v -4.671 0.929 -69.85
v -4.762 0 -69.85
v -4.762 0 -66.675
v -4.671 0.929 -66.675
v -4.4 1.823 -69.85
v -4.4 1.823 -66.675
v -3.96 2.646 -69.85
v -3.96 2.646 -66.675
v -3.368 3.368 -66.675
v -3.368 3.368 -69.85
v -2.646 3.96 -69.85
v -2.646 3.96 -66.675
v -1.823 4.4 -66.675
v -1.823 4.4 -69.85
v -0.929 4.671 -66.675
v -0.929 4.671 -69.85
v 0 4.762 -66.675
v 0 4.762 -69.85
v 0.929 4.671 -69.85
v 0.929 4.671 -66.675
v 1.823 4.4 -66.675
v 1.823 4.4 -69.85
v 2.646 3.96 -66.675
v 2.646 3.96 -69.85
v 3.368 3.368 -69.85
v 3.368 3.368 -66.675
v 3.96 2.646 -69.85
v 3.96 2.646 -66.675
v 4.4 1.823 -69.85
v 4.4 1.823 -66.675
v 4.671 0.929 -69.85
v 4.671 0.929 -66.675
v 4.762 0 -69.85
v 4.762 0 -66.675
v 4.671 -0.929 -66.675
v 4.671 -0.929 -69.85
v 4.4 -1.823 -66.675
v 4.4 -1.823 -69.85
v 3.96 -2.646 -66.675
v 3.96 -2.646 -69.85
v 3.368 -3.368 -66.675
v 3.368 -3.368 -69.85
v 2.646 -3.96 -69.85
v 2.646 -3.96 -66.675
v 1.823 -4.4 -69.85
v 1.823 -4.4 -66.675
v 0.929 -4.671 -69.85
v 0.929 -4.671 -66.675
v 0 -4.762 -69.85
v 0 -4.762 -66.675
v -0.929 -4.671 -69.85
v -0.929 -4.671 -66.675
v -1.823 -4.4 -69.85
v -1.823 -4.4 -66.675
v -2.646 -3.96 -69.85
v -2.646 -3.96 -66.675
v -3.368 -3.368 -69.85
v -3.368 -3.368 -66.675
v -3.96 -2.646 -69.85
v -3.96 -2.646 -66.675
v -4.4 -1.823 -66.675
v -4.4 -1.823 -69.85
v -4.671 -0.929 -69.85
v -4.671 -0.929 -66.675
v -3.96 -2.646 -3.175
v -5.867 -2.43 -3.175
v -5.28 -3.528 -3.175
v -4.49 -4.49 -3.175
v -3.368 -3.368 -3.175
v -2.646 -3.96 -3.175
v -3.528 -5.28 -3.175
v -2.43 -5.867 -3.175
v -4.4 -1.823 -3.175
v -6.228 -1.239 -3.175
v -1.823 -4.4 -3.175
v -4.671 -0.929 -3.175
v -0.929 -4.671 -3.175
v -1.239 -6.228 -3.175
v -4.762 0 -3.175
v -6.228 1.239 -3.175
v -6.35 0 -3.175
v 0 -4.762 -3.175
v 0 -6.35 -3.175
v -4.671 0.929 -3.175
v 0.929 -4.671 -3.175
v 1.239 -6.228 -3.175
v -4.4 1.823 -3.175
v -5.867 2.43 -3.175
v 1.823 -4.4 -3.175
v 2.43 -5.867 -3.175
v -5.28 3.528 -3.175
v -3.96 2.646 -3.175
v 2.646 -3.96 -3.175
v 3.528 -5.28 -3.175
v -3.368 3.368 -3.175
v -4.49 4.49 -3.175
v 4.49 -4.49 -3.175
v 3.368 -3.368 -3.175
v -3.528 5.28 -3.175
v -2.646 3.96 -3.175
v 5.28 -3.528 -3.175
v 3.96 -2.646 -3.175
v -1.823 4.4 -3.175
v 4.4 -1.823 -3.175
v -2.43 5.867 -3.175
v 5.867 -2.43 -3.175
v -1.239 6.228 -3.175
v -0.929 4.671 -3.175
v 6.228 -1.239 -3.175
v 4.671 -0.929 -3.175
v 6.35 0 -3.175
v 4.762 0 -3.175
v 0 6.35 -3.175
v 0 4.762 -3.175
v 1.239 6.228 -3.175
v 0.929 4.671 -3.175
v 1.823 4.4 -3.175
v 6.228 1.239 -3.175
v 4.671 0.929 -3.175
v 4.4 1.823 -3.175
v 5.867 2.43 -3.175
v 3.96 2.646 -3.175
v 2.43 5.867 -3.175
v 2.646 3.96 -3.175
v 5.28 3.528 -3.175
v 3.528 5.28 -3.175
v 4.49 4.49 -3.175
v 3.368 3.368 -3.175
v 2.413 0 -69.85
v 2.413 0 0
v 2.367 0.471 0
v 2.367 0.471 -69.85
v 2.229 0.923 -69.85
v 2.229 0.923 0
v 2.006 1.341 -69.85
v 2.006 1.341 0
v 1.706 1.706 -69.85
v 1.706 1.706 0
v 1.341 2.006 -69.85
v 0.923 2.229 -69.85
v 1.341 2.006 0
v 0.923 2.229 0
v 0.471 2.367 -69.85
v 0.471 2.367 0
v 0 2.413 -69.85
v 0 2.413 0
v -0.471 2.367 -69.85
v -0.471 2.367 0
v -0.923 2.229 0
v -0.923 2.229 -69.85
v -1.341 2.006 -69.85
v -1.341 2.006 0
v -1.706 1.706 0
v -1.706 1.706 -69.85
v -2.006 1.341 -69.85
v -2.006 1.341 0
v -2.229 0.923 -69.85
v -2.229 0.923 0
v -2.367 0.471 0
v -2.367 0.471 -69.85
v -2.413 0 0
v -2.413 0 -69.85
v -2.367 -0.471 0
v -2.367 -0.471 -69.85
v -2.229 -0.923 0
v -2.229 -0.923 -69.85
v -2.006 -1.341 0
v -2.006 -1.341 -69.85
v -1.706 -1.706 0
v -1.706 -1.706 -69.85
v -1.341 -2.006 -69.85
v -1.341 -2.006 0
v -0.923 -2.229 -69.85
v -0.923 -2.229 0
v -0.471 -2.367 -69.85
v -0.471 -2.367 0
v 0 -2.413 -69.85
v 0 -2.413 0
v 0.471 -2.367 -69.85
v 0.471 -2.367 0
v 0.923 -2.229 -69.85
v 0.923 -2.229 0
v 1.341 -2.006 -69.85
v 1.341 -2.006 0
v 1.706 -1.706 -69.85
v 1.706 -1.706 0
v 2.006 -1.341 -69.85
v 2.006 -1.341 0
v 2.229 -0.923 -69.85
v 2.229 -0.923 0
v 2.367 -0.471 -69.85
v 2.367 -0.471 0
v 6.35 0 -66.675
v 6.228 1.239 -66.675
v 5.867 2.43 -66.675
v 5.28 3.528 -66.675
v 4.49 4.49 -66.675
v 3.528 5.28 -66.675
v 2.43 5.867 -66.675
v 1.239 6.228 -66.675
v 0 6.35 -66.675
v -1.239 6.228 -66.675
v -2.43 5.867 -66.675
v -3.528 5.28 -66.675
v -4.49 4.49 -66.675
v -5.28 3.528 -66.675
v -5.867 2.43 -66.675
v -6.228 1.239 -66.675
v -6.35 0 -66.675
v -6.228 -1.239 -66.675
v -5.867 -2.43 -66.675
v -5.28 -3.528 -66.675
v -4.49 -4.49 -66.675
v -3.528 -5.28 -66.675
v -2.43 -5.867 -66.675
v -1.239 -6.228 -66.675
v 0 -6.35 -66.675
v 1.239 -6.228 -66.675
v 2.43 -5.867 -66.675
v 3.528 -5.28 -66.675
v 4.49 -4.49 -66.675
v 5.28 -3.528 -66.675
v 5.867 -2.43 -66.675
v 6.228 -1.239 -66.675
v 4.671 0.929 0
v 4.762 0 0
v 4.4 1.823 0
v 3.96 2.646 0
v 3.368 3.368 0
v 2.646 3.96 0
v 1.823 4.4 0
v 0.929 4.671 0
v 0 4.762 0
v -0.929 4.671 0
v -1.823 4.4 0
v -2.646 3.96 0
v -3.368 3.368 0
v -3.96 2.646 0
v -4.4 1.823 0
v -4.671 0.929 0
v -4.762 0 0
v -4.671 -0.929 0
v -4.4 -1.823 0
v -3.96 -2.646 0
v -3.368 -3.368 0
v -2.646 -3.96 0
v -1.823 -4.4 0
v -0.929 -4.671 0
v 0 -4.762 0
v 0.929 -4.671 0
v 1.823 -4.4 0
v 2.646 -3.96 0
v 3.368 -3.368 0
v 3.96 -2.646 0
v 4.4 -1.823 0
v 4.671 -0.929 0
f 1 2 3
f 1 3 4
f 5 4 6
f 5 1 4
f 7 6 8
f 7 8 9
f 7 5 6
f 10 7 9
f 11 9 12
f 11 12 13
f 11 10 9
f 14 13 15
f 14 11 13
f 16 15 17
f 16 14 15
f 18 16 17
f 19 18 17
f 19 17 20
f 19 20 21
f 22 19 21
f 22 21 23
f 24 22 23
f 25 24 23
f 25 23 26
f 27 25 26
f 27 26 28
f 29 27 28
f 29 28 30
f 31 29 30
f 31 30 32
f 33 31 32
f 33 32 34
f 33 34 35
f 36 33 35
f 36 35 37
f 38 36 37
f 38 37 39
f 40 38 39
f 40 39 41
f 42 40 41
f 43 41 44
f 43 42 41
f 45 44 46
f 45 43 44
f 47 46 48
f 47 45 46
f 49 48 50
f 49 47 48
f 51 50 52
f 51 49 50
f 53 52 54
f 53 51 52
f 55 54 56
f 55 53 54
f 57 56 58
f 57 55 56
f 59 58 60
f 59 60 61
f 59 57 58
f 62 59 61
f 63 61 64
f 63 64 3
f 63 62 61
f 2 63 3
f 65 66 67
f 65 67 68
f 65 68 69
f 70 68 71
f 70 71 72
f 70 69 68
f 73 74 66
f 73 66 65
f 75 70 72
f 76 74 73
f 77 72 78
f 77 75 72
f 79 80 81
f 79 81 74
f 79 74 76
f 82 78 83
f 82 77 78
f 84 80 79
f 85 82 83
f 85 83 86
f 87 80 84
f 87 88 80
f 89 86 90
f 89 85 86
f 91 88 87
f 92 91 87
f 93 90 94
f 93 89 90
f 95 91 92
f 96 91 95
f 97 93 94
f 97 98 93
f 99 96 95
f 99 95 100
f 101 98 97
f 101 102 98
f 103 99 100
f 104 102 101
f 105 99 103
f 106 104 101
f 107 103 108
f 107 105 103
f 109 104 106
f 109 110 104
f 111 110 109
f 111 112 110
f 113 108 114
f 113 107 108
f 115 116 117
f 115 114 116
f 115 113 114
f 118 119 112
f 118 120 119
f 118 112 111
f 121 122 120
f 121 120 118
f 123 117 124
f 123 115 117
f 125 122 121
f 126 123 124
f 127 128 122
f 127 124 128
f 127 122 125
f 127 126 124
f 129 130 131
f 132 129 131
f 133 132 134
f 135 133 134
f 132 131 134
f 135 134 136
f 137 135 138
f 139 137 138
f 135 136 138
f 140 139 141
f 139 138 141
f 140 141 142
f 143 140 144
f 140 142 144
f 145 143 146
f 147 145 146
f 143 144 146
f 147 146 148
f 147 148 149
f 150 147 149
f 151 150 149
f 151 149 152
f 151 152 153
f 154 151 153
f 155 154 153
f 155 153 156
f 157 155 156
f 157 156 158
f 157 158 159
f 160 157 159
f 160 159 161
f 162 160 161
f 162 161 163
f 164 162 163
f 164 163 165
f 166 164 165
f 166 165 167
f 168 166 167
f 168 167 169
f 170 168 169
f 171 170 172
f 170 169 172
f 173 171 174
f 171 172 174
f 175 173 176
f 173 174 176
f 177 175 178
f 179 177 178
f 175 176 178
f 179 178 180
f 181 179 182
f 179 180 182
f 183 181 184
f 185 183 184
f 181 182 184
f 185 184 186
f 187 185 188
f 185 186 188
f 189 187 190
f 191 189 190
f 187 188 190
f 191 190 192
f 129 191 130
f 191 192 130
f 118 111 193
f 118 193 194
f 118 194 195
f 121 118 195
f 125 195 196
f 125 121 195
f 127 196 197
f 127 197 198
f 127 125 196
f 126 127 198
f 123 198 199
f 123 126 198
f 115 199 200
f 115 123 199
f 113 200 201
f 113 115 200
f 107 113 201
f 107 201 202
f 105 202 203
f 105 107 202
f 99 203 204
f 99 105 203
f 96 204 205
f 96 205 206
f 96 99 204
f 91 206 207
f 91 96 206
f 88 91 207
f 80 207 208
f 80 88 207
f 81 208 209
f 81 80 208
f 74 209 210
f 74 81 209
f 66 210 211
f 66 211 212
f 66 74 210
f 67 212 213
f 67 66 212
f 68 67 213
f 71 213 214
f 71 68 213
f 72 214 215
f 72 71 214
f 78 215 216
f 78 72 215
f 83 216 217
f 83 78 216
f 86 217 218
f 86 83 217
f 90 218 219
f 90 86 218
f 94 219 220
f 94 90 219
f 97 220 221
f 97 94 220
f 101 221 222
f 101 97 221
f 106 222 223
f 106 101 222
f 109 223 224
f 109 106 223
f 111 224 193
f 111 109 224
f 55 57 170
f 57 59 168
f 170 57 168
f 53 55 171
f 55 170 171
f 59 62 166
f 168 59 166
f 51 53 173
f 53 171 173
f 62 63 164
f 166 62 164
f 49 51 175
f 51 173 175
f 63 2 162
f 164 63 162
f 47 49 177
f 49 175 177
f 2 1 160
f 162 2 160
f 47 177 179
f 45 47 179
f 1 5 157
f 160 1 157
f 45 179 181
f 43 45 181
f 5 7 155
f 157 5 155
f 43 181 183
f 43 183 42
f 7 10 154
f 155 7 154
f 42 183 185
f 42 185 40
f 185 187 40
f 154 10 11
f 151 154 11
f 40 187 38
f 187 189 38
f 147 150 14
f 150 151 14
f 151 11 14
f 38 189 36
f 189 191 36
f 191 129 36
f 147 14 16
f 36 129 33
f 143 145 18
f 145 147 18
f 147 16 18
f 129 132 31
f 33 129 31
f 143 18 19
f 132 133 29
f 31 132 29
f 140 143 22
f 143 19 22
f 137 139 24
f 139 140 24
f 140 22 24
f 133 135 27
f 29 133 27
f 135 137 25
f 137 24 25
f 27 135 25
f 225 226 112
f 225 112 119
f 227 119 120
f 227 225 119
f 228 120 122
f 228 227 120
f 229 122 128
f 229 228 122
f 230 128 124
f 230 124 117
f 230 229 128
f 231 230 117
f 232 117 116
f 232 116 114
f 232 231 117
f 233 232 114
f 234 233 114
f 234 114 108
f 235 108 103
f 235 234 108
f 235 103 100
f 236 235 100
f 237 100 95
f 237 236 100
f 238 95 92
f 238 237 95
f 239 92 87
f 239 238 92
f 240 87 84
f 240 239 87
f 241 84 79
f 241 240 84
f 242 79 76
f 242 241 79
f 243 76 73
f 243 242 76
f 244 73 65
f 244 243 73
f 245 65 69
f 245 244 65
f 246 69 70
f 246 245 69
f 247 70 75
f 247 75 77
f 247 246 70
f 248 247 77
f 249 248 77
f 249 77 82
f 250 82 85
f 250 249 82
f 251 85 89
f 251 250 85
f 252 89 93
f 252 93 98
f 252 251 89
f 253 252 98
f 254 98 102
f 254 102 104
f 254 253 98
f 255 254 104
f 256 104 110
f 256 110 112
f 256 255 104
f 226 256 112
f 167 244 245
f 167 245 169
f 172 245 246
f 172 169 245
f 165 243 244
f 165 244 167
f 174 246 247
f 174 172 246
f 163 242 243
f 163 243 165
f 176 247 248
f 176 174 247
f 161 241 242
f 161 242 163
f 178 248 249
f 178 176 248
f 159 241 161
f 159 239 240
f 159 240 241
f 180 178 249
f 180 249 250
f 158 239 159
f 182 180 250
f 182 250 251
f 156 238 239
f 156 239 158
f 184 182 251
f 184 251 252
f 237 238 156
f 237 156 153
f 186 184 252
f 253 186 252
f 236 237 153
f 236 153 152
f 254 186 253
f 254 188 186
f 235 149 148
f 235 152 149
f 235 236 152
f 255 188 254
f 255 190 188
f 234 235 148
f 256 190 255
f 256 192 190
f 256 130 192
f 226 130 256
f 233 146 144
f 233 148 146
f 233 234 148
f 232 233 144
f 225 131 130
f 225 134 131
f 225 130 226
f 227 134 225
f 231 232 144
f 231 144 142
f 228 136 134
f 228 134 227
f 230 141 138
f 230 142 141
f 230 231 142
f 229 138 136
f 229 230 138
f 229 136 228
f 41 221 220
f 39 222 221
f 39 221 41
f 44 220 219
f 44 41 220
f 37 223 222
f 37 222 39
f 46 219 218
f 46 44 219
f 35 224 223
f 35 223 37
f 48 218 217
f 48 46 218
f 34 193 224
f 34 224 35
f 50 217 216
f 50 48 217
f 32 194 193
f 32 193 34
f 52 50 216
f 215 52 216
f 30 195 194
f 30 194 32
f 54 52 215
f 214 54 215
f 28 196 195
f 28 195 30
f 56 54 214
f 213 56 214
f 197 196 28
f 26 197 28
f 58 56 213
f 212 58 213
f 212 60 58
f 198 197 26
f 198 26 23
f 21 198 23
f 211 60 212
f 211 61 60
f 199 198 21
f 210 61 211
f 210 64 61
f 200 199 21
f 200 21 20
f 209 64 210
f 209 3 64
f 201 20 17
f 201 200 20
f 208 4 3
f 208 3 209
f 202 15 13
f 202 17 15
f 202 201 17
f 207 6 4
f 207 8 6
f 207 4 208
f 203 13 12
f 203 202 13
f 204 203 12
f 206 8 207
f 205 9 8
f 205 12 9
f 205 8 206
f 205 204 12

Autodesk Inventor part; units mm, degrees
ref_plane "YZ Plane" through (0, 0, 0) normal (1, 0, 0) x (0, 1, 0)
ref_plane "XZ Plane" through (0, 0, 0) normal (0, 1, 0) x (-1, 0, 0)
ref_plane "XY Plane" through (0, 0, 0) normal (0, 0, 1) x (1, 0, 0)
sketch "Sketch1" plane through (0, 0, 0) normal (0, 0, 1) x (1, 0, 0)
  circle A0 centre (0, 0) radius 6.35
  dimension "d0" = 12.7
extrude "Extrusion1" add sketch "Sketch1" against normal blind 69.85
sketch "Sketch6" plane through (0, 0, 0) normal (0, 0, 1) x (1, 0, 0)
  circle A0 centre (0, 0) radius 6.35 projected
  circle A1 centre (0, 0) radius 2.413
  circle A2 centre (0, 0) radius 4.7625
  dimension "d43" = 4.826
  dimension "d44" = 9.525
extrude "Extrusion11" cut sketch "Sketch6" against normal blind 3.175 contours A0
sketch "Sketch7" plane through (0, 0, -69.85) normal (0, 0, -1) x (-1, 0, 0)
  circle A0 centre (0, 0) radius 6.35 projected
  circle A1 centre (0, 0) radius 4.7625 projected
extrude "Extrusion12" cut sketch "Sketch7" against normal blind 3.175
extrude "Extrusion13" cut sketch "Sketch6" against normal through all contours A1
thread "Thread7" size "10-24 UNC" class "2B" standard "ANSI Unified Screw Threads" full length
properties part number "lower box weel shaft steel 2"
